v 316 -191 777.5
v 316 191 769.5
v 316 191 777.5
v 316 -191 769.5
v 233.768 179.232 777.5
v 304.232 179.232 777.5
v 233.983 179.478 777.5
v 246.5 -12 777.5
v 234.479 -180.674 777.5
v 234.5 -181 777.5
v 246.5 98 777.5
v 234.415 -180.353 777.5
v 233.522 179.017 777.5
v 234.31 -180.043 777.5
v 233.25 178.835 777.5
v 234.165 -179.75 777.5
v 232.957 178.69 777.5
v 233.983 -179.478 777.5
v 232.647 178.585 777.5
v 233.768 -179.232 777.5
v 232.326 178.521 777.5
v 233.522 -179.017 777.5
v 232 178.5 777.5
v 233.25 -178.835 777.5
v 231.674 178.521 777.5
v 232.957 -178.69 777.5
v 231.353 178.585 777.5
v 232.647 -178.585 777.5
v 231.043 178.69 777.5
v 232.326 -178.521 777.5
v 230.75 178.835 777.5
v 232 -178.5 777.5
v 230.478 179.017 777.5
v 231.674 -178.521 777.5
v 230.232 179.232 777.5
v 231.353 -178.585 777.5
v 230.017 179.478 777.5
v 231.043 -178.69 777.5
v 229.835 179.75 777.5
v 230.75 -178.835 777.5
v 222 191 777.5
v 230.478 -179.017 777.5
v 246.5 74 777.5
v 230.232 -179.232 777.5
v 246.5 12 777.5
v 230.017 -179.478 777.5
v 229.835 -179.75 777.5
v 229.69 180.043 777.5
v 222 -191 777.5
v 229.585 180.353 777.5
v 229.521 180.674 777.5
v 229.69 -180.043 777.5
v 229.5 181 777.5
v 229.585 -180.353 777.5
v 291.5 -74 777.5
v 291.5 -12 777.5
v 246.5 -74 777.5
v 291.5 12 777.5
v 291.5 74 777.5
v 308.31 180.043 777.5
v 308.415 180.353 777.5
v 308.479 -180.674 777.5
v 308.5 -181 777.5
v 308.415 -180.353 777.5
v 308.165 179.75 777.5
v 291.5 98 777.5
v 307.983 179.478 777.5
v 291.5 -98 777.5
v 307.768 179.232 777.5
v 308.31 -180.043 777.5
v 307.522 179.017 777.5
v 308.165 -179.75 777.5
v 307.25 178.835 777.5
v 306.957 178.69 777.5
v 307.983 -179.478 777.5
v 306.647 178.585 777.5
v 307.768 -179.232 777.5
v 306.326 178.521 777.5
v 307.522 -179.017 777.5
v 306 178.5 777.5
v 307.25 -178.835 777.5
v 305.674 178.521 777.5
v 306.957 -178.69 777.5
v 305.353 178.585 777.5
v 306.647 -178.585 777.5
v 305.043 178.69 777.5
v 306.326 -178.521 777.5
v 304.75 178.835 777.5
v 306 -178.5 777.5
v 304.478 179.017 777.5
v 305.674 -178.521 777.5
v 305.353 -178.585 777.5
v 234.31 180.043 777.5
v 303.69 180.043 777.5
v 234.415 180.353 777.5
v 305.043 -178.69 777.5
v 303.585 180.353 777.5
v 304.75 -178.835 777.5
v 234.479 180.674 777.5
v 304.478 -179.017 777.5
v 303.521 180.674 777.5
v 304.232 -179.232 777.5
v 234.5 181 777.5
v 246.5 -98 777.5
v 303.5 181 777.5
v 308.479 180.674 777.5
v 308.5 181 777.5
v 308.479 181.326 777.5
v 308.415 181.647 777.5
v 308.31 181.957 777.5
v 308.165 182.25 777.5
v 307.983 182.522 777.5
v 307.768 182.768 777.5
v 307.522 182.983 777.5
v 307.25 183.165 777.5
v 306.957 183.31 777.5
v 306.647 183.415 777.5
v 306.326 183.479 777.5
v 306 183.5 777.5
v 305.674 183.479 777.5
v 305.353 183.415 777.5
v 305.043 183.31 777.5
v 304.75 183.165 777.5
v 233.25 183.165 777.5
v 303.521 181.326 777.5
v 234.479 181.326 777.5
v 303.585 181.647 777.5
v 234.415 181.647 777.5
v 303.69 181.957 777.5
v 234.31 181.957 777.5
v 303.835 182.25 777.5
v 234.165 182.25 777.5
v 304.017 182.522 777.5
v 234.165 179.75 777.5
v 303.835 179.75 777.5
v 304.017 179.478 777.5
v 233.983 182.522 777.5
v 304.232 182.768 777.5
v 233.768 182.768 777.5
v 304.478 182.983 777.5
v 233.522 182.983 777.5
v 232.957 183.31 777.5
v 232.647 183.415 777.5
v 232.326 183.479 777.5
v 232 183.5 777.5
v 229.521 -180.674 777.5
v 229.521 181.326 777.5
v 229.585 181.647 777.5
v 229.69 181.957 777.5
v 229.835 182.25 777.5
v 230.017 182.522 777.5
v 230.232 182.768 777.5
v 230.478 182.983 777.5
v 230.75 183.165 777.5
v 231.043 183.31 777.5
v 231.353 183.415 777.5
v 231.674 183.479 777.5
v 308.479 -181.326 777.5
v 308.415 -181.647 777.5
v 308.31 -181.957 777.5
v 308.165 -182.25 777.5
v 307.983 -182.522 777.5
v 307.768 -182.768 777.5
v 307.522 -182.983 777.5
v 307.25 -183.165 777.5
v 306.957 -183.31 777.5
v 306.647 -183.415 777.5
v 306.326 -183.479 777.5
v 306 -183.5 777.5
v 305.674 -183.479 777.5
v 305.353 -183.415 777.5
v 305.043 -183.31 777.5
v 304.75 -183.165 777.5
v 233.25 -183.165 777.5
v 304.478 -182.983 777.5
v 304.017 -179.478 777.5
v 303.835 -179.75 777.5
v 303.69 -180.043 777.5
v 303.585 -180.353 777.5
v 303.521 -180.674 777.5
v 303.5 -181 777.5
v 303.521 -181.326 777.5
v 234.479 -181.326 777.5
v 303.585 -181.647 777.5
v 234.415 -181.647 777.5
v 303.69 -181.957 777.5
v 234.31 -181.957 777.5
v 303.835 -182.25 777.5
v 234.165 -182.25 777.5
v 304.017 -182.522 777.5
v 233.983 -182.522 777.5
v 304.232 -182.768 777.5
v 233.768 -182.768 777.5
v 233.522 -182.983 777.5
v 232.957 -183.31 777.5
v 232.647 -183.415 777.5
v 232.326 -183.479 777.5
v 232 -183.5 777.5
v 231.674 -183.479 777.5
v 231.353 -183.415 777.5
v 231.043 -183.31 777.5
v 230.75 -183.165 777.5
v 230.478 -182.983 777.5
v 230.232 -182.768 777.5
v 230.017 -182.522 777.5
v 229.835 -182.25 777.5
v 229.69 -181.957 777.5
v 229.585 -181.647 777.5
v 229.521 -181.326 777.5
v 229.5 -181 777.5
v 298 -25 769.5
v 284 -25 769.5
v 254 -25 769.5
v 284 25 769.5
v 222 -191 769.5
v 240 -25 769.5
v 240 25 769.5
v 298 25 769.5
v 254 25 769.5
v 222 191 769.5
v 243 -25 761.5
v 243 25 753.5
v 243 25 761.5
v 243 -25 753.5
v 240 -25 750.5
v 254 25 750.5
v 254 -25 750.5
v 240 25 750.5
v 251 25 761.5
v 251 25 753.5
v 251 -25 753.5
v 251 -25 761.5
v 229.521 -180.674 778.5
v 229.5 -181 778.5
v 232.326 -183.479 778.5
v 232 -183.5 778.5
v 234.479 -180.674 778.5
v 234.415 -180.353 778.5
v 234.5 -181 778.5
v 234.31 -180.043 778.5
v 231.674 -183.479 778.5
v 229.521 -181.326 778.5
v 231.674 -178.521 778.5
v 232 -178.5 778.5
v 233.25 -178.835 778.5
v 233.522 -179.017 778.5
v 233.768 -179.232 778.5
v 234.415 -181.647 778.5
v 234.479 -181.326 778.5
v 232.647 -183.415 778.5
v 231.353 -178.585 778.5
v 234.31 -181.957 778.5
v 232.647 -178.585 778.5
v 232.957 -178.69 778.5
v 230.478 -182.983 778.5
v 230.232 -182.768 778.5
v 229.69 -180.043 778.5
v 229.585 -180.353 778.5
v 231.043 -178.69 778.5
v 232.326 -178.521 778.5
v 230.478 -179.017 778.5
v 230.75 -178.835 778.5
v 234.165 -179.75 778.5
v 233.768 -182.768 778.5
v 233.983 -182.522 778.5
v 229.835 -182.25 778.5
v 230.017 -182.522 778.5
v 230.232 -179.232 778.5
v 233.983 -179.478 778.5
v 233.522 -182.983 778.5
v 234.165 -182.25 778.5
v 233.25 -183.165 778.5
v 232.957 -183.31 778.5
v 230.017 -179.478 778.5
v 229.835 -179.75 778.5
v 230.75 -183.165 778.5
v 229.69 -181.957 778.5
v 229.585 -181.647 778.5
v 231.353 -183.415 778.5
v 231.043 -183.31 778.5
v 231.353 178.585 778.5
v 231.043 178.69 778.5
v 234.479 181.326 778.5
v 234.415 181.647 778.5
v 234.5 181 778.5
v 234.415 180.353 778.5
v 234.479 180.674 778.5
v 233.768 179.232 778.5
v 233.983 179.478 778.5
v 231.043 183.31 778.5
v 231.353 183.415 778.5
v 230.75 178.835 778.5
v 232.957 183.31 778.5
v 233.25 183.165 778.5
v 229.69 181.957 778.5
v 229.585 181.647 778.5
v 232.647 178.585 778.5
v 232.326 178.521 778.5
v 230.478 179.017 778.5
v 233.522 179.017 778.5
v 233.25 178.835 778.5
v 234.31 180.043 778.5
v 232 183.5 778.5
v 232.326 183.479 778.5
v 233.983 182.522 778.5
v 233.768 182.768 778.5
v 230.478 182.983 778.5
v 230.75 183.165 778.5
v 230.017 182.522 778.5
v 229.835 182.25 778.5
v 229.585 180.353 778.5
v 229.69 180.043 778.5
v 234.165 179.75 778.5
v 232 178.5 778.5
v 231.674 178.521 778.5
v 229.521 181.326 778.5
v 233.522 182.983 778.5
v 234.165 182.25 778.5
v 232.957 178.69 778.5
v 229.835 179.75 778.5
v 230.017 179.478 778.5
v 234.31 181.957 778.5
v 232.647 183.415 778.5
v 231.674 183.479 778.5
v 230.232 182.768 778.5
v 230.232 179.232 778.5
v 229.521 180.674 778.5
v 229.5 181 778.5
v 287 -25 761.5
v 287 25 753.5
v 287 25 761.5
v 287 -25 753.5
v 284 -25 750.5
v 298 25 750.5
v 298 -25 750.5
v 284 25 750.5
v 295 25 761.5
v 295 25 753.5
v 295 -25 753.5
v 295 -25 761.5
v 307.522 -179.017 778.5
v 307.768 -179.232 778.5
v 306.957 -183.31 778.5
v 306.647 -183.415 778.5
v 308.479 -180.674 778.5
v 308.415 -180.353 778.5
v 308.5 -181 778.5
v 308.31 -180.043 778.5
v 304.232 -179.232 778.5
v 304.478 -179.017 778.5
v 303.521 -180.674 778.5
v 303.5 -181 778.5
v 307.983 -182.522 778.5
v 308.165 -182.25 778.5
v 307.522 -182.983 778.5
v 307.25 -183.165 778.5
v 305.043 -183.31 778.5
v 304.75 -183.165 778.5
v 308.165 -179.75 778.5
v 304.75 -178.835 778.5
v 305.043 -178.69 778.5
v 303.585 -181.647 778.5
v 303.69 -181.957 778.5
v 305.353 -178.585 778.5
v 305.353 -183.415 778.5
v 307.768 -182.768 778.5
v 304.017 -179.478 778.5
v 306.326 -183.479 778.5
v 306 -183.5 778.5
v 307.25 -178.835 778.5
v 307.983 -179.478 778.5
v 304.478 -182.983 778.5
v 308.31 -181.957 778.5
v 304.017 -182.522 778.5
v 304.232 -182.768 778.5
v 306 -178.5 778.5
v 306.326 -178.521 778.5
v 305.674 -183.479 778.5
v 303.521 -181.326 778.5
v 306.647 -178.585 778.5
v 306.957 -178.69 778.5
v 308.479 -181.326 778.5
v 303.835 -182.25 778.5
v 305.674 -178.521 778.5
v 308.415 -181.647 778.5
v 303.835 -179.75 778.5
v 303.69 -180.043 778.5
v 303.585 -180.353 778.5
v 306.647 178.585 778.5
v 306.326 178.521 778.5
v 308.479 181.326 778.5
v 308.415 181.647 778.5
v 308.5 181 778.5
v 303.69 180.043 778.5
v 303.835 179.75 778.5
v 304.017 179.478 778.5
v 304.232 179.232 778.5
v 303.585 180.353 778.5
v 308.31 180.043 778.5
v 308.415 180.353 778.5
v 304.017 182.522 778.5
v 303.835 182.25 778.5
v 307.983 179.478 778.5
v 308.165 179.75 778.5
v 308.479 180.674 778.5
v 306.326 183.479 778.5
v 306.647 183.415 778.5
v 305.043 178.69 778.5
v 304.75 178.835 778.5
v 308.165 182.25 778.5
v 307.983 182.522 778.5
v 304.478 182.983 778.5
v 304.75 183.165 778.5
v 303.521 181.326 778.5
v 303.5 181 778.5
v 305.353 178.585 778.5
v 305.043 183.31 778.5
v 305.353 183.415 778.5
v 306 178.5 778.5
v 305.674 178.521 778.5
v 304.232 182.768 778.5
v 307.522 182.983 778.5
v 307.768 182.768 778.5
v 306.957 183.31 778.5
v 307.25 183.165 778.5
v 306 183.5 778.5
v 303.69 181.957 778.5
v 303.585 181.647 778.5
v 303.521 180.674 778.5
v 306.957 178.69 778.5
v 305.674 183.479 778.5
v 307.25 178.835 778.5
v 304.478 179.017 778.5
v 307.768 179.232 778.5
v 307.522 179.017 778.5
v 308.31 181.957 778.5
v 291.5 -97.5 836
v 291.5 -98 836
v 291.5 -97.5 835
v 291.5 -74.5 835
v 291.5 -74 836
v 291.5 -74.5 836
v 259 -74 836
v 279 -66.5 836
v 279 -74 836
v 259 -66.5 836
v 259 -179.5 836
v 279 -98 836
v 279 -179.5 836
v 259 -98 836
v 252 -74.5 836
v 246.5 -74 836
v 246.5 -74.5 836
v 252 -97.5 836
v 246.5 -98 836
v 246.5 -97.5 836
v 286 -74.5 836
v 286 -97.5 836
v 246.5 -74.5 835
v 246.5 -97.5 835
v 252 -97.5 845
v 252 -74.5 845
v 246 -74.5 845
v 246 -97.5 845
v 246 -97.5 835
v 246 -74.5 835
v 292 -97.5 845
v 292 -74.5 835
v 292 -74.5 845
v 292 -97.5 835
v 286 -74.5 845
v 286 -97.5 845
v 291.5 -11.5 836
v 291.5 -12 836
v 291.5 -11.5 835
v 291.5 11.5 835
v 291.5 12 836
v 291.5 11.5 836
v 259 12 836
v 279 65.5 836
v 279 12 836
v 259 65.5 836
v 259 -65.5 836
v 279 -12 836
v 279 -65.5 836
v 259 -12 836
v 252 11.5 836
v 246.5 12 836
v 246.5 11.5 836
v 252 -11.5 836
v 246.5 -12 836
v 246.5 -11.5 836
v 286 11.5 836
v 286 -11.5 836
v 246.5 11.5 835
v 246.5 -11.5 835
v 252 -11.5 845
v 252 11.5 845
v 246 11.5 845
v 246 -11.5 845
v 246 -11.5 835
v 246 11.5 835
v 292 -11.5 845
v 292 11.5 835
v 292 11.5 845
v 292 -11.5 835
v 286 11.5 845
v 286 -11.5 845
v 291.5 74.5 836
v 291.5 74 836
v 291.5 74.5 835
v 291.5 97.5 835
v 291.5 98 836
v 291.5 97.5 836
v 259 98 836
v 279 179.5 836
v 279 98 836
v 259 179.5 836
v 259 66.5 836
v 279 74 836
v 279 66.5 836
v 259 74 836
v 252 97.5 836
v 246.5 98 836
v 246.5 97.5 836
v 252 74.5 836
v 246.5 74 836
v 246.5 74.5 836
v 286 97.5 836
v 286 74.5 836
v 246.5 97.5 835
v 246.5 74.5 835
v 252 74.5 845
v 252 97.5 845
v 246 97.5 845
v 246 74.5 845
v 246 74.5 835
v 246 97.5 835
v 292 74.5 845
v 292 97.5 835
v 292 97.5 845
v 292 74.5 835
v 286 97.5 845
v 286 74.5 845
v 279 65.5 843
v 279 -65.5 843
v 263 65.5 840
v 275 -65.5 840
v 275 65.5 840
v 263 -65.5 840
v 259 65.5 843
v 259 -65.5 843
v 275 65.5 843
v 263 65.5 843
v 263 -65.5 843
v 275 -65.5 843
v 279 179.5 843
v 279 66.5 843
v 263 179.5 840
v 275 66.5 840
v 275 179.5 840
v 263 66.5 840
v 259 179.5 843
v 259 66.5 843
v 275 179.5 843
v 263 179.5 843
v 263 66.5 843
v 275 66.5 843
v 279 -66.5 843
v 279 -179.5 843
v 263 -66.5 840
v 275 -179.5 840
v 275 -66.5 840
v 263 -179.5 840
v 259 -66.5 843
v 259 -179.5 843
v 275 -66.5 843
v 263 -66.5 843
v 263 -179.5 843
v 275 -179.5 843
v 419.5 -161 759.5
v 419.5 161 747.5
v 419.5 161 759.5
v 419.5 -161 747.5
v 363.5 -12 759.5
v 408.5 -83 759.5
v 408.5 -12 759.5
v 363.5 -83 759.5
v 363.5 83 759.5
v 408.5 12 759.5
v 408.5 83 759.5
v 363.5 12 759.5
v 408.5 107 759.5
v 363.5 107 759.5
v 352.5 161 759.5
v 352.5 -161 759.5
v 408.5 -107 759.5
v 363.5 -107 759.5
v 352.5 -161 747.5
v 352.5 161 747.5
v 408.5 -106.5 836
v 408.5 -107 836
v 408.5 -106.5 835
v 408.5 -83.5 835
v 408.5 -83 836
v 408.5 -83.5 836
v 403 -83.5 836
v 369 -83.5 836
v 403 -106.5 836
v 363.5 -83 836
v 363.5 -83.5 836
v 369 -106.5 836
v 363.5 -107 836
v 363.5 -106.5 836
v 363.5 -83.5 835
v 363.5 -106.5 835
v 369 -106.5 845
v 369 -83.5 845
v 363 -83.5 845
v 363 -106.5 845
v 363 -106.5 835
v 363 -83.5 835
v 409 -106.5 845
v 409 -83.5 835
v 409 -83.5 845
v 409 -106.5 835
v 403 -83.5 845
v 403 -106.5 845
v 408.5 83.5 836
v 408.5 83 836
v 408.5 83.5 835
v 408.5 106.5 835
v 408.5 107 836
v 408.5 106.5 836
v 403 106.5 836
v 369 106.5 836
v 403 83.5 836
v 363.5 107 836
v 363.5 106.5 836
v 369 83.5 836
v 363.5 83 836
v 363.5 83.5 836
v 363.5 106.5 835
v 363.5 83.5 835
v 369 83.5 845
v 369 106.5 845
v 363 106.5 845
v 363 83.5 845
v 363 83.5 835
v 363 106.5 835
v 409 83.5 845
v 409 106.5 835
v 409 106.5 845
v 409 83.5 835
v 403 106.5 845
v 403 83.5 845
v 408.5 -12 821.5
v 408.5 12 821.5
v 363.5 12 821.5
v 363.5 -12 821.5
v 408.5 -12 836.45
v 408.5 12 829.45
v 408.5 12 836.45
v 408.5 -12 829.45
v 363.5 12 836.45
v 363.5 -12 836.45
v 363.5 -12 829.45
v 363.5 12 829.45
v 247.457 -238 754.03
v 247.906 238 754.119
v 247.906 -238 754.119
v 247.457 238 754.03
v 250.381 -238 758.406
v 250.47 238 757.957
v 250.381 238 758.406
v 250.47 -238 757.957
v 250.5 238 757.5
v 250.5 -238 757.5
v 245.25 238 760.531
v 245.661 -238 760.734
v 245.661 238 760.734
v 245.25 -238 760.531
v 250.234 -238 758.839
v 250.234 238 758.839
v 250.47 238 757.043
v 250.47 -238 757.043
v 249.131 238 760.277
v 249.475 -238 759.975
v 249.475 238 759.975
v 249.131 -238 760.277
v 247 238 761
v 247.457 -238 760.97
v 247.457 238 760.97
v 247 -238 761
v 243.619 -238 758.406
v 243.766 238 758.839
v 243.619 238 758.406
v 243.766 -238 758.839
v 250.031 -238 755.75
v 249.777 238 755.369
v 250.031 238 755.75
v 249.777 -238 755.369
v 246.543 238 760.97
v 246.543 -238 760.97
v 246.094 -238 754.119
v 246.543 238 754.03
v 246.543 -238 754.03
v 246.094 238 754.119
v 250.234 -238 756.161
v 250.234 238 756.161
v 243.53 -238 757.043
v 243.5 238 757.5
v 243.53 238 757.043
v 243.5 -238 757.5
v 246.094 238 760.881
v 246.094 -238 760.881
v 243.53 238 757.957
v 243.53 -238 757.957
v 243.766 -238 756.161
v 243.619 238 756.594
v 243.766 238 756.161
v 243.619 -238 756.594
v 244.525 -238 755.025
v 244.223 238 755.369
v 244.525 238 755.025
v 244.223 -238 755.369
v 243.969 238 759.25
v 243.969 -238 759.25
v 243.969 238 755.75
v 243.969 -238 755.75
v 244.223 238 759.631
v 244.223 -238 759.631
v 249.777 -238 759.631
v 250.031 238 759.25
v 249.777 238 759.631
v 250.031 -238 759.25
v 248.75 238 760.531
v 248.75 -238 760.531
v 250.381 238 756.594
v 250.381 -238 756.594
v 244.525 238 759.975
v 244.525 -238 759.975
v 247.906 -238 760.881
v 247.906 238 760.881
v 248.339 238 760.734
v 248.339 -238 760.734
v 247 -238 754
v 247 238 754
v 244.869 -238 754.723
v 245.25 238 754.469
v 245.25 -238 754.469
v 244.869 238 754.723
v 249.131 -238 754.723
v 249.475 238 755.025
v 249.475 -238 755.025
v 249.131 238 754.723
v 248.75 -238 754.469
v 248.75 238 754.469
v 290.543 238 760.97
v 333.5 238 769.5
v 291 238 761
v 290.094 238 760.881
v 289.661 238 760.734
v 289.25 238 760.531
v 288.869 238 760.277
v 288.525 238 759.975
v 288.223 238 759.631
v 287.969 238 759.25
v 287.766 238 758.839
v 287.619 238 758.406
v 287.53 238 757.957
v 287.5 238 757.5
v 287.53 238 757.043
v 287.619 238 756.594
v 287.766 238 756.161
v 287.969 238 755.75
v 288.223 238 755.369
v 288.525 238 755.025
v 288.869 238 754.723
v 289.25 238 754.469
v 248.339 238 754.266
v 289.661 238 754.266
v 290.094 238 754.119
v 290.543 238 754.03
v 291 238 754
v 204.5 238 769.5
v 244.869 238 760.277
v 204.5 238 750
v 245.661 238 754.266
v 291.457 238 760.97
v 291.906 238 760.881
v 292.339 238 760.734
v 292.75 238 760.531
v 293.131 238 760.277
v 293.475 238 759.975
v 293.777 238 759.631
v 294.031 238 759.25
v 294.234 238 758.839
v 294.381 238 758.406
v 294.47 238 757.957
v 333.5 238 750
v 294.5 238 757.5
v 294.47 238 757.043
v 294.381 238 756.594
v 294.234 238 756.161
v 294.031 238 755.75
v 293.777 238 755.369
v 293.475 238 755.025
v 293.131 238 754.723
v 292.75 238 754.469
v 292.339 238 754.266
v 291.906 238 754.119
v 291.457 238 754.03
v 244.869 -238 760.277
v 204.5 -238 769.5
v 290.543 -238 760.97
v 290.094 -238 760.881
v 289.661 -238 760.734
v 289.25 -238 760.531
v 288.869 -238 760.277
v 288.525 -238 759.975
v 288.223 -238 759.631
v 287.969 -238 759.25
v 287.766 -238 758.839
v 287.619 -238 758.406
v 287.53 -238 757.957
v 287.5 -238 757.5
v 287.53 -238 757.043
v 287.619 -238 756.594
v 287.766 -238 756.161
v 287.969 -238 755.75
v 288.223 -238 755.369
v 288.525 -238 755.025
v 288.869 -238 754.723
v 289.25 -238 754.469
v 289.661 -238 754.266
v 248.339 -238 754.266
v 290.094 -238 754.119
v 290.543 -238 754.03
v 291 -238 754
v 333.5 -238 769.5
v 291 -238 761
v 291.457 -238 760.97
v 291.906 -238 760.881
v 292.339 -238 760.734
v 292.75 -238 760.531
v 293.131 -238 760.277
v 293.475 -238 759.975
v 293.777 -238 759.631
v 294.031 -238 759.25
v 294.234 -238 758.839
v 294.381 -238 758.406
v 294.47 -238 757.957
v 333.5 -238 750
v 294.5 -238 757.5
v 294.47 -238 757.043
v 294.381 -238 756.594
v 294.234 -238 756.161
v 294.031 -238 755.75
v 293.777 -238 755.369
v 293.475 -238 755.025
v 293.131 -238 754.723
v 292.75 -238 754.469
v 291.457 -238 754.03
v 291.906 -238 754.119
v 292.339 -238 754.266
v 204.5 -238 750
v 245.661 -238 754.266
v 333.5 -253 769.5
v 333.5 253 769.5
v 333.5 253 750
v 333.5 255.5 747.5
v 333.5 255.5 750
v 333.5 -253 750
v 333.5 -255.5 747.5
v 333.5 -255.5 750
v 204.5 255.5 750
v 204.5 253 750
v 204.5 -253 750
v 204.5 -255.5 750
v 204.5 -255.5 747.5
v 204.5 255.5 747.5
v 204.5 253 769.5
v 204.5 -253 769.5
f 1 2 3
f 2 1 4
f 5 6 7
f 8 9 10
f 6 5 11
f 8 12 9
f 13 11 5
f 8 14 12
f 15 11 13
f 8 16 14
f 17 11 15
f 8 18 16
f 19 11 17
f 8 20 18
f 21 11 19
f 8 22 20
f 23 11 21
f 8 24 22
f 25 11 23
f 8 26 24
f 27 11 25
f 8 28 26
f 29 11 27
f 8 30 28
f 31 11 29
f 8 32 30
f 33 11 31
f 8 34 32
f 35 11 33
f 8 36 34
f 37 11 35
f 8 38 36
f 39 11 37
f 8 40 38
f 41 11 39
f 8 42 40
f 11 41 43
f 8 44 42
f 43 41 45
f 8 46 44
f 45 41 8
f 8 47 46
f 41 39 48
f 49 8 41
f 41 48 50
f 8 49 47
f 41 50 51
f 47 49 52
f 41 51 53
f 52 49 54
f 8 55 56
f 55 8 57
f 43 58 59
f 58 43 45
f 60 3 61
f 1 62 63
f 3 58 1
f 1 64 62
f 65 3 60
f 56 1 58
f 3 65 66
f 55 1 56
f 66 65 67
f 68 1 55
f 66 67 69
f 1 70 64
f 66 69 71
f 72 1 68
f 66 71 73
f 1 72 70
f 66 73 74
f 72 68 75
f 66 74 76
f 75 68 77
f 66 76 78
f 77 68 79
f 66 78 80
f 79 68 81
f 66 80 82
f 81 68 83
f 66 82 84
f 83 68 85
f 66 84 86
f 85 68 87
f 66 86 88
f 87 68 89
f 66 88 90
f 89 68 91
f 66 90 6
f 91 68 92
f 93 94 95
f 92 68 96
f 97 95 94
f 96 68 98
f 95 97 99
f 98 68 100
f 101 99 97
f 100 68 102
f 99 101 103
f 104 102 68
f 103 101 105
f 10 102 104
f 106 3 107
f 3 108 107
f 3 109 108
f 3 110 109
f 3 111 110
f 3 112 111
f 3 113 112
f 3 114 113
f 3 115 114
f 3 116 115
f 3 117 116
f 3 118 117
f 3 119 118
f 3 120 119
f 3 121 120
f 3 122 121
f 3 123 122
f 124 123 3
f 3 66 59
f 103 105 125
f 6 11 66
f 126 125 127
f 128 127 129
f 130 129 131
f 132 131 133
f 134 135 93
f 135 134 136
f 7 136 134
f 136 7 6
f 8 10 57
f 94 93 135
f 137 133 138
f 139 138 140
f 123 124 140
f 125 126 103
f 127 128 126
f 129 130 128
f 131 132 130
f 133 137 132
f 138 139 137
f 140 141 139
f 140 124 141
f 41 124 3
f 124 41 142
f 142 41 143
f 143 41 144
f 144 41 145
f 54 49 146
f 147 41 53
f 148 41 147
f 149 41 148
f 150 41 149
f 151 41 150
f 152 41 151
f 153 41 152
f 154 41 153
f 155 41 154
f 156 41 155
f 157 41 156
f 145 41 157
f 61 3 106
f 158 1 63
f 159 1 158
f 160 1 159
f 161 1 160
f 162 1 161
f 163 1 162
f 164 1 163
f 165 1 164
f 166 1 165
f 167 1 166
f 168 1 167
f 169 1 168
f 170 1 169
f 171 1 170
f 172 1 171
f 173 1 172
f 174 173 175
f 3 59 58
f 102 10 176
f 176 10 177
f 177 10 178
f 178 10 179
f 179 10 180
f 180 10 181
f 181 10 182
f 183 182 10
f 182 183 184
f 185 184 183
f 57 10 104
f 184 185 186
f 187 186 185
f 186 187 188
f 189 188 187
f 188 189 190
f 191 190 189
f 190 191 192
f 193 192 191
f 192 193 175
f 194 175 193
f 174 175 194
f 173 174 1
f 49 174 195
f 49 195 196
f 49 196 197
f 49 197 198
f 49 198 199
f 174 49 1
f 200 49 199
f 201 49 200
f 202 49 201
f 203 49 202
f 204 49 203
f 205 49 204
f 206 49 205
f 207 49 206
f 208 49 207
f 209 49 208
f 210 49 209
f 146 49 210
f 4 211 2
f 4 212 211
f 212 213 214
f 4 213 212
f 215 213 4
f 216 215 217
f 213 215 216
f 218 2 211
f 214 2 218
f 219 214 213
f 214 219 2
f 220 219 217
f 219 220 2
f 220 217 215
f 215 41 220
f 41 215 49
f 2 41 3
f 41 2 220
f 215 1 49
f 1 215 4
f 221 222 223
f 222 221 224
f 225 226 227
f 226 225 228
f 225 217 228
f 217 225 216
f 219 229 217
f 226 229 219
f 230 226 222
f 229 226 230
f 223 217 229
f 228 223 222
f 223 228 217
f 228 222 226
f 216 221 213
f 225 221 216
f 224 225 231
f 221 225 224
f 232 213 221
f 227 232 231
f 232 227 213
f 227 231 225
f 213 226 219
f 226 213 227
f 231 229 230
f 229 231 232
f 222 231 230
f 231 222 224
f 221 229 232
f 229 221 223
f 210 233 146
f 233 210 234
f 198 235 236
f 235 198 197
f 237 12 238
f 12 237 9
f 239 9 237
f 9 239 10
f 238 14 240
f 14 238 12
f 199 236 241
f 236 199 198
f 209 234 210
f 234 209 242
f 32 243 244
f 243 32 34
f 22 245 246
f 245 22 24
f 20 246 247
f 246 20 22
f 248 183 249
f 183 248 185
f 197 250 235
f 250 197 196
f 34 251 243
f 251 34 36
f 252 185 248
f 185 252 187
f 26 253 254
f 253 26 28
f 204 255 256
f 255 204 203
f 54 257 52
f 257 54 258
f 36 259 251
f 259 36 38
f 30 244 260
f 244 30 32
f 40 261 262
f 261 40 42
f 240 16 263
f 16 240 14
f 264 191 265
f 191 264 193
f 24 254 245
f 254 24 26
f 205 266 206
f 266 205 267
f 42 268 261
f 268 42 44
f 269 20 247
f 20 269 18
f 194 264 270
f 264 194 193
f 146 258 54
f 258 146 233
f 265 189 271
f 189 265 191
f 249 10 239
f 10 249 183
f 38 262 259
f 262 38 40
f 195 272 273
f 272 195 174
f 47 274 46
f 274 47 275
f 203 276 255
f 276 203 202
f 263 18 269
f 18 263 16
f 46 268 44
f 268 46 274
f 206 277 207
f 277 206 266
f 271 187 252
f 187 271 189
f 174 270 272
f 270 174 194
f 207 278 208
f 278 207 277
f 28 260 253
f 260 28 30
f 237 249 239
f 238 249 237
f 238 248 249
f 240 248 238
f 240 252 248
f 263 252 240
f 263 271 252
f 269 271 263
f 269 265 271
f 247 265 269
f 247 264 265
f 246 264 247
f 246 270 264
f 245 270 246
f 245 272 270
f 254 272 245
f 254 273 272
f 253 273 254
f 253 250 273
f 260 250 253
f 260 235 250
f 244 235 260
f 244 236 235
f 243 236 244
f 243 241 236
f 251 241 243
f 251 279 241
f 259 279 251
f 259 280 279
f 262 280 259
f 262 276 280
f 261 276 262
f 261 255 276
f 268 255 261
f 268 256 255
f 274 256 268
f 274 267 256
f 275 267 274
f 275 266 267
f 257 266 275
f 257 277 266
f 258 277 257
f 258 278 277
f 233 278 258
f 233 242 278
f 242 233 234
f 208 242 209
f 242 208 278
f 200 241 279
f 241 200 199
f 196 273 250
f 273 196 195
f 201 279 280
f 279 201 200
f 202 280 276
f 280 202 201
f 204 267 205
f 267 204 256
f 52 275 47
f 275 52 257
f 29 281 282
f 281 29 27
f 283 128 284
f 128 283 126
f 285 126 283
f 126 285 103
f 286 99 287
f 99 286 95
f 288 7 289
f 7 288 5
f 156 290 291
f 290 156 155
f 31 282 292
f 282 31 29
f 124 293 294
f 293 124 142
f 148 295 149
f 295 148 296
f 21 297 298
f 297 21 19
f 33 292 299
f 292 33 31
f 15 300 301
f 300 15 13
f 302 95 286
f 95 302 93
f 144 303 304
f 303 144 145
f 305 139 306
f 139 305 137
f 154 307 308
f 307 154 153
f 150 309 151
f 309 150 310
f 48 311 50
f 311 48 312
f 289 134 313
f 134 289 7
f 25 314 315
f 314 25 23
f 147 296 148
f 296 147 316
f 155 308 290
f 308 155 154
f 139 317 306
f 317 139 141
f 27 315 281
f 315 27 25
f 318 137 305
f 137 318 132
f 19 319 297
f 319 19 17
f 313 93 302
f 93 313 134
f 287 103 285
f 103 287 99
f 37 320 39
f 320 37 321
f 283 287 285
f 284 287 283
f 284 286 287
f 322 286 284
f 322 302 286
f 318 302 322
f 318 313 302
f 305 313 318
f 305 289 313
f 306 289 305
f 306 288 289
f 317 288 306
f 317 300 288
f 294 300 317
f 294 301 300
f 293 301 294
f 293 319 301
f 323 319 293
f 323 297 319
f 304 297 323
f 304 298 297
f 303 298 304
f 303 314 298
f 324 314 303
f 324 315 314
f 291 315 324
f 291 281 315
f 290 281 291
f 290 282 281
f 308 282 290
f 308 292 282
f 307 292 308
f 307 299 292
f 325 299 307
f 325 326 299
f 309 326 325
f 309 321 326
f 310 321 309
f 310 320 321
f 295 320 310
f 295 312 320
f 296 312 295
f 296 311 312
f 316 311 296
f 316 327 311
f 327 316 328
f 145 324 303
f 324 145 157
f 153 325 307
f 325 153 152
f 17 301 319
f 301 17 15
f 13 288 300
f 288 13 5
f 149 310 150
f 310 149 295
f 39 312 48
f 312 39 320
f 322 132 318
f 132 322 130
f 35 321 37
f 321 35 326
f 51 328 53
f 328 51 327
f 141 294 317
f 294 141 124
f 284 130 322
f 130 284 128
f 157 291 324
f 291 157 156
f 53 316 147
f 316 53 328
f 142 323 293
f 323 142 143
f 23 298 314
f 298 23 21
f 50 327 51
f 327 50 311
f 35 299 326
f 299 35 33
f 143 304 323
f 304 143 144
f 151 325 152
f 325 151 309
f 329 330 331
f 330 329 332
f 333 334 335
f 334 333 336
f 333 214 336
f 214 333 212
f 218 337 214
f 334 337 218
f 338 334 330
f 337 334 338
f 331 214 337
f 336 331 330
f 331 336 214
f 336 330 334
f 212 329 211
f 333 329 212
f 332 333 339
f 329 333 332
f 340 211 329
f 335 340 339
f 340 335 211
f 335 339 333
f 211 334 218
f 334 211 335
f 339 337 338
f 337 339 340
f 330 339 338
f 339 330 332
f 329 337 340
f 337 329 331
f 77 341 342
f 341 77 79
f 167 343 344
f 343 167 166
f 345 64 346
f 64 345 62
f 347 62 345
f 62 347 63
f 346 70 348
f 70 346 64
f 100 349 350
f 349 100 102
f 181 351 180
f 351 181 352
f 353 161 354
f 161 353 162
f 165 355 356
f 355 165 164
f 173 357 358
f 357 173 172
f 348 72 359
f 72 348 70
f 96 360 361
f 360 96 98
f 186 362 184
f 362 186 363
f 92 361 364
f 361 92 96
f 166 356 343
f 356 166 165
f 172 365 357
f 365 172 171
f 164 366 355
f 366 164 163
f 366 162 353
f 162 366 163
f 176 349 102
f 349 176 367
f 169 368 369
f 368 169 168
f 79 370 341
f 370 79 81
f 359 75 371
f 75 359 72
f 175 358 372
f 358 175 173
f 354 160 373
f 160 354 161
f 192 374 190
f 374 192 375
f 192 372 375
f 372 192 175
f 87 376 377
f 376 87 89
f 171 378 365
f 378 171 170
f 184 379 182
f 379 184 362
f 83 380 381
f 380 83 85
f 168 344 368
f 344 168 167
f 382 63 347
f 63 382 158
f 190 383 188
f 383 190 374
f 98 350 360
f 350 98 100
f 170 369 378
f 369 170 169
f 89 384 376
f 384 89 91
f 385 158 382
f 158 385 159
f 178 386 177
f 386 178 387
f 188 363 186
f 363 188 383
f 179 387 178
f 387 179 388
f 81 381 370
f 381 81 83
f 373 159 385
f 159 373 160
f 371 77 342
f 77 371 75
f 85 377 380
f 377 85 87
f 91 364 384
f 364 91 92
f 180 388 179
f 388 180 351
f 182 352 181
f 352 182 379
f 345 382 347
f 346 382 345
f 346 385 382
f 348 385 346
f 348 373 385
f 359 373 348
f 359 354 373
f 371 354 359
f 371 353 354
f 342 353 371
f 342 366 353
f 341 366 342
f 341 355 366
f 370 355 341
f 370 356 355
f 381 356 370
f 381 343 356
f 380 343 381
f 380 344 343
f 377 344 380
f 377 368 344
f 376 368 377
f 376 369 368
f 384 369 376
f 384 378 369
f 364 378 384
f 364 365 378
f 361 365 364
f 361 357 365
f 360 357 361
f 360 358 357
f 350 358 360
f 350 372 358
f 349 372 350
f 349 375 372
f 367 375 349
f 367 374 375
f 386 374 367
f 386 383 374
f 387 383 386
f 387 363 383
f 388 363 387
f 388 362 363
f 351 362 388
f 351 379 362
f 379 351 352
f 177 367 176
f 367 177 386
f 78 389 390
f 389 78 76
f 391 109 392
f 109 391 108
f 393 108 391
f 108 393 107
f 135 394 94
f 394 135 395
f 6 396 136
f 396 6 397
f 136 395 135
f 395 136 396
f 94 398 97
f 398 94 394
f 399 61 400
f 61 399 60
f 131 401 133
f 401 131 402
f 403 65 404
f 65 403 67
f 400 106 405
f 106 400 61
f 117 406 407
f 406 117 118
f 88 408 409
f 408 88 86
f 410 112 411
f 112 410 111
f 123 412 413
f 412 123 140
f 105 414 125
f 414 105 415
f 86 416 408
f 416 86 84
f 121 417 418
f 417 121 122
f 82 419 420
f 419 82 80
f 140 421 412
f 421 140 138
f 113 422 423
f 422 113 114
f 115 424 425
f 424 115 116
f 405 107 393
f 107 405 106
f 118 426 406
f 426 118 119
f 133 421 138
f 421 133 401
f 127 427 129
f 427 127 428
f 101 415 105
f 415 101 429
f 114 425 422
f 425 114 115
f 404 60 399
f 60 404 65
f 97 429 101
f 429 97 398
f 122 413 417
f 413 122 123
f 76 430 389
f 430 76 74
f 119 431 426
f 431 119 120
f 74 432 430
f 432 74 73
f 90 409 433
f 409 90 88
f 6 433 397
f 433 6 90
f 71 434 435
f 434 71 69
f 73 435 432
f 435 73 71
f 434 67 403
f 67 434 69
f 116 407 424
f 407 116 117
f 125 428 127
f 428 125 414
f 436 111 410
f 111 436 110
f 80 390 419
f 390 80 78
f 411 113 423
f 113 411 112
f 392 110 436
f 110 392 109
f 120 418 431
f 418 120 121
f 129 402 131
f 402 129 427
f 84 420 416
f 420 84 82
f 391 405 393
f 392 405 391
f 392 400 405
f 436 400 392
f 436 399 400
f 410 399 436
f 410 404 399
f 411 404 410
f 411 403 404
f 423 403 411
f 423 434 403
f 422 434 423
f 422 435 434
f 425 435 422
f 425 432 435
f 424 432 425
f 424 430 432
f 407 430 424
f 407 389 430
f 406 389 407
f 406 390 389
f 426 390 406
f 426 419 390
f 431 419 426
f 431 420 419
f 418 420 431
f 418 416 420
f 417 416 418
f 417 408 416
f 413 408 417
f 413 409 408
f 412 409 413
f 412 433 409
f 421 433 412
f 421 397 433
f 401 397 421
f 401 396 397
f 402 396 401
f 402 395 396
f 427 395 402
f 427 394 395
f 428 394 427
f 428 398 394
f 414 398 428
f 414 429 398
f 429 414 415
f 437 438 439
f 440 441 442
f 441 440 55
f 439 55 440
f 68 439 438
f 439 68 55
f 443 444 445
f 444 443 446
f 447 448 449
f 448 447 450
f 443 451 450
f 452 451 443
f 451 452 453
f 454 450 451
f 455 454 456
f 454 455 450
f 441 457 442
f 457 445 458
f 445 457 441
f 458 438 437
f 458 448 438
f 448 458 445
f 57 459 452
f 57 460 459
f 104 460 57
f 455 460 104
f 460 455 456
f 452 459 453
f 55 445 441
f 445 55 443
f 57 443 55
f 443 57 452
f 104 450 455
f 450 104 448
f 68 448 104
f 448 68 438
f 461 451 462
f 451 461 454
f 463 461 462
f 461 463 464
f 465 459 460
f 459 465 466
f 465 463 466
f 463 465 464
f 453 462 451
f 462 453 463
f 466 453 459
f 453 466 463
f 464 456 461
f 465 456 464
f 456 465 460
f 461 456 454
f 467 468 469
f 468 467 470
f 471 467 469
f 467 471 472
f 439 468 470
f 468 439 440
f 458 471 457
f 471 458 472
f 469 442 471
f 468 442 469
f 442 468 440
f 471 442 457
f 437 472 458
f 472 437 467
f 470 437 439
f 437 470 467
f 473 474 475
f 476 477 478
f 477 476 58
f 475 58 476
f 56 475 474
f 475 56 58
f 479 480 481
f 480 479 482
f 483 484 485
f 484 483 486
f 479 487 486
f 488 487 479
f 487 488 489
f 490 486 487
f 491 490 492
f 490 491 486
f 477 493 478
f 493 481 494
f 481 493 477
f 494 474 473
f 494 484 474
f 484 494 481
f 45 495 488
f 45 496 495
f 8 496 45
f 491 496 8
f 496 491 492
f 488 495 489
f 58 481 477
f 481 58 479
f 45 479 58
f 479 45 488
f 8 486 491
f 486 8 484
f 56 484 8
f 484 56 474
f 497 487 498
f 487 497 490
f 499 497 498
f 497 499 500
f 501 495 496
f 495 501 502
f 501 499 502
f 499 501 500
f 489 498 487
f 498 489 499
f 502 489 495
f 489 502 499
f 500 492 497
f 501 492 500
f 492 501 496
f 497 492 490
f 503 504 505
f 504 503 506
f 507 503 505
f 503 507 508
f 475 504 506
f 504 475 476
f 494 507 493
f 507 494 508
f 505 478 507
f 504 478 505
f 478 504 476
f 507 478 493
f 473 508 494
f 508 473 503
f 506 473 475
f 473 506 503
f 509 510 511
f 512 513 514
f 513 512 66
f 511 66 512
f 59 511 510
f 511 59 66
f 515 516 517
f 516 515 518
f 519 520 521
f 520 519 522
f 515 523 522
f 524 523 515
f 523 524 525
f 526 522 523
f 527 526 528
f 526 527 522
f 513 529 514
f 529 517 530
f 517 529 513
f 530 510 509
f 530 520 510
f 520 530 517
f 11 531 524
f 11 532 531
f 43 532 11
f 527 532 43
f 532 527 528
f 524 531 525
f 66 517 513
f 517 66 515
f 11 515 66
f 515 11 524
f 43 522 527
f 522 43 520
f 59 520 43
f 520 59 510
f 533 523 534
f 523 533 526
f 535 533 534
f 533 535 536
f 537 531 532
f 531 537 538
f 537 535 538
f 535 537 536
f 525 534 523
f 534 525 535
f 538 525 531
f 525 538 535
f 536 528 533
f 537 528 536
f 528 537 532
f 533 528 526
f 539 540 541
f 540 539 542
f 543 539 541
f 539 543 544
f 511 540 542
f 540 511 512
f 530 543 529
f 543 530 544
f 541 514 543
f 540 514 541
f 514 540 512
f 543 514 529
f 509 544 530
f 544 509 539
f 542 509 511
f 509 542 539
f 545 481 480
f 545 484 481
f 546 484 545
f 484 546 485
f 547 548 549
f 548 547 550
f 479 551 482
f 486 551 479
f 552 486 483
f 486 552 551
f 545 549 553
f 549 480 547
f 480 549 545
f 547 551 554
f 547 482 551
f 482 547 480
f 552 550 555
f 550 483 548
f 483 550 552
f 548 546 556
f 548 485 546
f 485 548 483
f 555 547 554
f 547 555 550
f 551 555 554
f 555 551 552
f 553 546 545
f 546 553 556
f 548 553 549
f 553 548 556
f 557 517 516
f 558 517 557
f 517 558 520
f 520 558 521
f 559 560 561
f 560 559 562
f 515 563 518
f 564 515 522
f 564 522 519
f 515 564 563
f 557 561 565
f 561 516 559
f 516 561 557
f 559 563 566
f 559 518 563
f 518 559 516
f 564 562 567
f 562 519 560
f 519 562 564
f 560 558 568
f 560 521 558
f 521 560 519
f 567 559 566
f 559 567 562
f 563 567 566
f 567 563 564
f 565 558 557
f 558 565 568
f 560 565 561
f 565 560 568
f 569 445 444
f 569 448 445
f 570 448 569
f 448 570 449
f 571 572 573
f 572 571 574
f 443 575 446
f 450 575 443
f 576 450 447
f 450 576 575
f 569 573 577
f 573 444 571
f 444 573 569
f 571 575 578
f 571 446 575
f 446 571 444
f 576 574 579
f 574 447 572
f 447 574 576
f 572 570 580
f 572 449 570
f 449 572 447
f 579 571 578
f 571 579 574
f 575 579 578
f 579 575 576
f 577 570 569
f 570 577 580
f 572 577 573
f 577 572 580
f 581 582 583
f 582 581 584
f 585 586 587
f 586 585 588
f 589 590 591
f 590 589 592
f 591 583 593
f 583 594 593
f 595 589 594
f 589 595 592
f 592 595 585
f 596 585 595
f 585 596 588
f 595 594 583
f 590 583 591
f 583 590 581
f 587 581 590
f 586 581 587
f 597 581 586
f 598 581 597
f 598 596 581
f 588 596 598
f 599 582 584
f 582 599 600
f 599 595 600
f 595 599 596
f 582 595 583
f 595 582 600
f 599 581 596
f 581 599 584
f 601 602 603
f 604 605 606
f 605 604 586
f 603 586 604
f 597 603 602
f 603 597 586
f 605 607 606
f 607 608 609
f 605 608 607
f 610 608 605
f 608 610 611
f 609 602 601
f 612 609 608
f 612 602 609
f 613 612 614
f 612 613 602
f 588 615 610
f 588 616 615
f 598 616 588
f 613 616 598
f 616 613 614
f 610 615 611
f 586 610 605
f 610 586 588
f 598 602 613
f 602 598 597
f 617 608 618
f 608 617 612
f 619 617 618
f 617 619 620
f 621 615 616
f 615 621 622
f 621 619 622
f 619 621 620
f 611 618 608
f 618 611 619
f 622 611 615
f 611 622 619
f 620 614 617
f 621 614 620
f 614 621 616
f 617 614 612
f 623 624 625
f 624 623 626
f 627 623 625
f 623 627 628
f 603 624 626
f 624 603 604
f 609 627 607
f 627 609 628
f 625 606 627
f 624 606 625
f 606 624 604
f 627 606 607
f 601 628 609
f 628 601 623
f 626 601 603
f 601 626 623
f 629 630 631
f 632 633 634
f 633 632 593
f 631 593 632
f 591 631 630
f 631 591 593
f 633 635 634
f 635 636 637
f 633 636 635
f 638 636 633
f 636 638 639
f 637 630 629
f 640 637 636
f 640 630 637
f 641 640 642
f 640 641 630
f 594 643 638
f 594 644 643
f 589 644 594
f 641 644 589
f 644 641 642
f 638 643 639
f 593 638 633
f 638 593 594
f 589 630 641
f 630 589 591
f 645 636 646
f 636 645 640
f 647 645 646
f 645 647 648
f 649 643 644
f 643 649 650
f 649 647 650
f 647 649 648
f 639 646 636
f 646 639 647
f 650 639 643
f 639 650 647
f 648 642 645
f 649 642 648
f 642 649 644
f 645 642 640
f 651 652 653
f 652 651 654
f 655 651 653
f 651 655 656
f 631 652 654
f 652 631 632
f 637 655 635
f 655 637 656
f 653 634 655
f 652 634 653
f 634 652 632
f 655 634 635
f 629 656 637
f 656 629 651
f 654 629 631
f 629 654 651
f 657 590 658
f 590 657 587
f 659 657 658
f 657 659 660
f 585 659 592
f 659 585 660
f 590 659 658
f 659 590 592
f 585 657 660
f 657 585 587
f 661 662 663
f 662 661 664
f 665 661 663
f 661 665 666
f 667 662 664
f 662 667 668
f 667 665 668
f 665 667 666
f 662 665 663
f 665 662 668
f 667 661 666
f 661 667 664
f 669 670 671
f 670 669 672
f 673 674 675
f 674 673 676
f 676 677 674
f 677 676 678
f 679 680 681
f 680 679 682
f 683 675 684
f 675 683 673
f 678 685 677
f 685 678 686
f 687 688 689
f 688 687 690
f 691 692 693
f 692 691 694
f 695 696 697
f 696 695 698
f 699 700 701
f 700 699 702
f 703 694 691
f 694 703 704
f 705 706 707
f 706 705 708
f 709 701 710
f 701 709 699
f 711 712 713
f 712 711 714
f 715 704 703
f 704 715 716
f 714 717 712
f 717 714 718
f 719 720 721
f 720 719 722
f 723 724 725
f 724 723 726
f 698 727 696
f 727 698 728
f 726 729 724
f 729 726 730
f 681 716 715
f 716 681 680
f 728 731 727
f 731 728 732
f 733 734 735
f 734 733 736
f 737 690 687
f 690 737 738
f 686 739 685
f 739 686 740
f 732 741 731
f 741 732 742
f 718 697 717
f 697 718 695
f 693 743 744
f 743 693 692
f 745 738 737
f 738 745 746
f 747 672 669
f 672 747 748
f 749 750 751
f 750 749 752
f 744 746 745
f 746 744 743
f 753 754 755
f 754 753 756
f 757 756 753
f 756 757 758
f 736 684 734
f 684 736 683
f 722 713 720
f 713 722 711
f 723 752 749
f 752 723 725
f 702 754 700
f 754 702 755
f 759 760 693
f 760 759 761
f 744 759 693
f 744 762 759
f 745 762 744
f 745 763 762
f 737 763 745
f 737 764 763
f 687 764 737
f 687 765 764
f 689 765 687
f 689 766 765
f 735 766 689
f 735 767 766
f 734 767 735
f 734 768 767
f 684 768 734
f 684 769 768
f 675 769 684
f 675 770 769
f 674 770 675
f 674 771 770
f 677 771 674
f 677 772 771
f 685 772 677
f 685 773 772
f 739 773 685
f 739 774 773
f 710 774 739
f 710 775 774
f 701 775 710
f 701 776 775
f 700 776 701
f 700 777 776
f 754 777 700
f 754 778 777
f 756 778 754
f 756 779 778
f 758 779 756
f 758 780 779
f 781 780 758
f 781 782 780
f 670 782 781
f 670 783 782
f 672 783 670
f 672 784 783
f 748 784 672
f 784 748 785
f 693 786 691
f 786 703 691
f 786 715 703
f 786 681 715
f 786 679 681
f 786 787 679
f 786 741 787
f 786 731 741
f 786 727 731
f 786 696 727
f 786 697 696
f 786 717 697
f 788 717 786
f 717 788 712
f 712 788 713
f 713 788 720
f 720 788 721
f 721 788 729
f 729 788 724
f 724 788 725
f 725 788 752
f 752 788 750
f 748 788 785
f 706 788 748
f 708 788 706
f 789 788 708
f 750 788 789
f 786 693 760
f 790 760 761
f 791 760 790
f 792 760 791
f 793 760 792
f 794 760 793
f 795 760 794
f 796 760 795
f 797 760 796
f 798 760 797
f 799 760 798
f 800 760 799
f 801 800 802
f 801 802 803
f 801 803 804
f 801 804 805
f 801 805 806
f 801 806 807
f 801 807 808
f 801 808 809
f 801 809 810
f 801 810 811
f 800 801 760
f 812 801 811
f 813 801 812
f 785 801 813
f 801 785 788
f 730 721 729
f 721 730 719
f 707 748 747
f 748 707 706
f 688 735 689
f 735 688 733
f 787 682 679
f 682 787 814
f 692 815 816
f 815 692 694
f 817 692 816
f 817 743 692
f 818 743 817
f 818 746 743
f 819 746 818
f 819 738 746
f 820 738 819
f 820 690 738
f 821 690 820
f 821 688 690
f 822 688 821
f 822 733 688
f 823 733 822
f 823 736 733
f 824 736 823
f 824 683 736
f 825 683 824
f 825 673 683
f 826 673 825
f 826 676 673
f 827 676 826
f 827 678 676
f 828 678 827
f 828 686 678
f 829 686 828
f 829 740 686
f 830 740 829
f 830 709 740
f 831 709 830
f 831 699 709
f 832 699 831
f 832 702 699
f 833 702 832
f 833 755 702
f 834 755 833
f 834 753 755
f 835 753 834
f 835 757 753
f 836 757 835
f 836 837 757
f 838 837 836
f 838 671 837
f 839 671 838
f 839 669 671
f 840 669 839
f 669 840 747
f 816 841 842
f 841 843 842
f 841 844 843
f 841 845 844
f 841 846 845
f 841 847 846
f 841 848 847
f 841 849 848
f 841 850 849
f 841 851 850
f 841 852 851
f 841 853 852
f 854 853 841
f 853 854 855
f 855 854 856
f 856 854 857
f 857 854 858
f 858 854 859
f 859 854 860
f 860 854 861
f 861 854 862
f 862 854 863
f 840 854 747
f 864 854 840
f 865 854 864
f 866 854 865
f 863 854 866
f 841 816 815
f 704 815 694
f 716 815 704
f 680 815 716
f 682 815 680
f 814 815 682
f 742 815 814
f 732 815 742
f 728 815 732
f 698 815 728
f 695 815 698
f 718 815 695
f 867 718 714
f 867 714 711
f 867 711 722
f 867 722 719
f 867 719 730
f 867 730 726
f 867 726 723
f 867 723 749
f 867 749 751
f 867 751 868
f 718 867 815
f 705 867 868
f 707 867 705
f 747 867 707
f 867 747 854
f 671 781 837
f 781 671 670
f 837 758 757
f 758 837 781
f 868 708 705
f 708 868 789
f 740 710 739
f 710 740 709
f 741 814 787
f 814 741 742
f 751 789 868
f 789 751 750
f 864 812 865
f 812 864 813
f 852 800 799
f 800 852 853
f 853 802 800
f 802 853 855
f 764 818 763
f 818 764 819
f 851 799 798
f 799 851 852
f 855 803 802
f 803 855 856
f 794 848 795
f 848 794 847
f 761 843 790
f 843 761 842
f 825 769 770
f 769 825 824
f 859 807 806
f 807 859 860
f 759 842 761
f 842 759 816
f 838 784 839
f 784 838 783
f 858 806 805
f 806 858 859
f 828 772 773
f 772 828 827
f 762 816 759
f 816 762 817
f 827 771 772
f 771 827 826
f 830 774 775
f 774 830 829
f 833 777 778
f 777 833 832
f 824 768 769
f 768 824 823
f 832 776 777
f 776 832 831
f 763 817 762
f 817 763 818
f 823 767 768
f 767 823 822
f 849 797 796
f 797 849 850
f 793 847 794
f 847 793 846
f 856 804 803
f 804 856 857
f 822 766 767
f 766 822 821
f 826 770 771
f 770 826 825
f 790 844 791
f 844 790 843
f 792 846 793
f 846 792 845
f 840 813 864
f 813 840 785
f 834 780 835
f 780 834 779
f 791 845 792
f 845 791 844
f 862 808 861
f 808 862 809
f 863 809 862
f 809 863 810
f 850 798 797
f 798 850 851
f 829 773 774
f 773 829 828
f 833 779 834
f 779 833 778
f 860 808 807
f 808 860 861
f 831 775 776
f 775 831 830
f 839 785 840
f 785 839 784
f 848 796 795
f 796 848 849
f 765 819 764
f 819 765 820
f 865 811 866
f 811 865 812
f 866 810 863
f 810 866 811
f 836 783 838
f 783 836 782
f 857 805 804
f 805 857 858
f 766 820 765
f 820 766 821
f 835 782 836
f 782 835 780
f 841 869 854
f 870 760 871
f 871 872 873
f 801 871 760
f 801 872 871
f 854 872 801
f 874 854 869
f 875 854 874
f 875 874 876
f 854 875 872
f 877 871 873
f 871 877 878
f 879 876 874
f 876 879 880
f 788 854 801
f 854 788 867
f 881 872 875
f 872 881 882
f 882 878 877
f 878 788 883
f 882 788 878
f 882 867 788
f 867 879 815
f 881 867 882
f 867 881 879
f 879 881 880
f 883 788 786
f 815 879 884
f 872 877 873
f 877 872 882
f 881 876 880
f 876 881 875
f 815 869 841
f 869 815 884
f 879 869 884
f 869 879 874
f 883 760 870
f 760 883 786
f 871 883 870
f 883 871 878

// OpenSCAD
// Millimetre geometric reference; use real functional tools, not printed heated or cutting equipment.
// Source SHA-256: 94f34a7056a9d24379da1dac9f9b9d27ac03e0cb14ce7981b4b7693647e8a8c4
$fn=48;
module profile_carriage(){
translate([0, 0, 11]) rotate([0, 0, 0]) cube([94, 382, 8],center=true);
translate([-27.5, 0, -5]) rotate([0, 0, 0]) cube([3, 50, 14],center=true);
translate([-16.5, 0, -5]) rotate([0, 0, 0]) cube([3, 50, 14],center=true);
translate([-22, 0, -10.5]) rotate([0, 0, 0]) cube([8, 50, 3],center=true);
translate([-22, 0, 0.5]) rotate([0, 0, 0]) cube([8, 50, 3],center=true);
translate([-22, 0, 4.5]) rotate([0, 0, 0]) cube([14, 50, 6],center=true);
translate([-37, -181, 15.5]) rotate([0, 0, 0]) cylinder(r=2.5,h=1,center=true);
translate([-37, 181, 15.5]) rotate([0, 0, 0]) cylinder(r=2.5,h=1,center=true);
translate([16.5, 0, -5]) rotate([0, 0, 0]) cube([3, 50, 14],center=true);
translate([27.5, 0, -5]) rotate([0, 0, 0]) cube([3, 50, 14],center=true);
translate([22, 0, -10.5]) rotate([0, 0, 0]) cube([8, 50, 3],center=true);
translate([22, 0, 0.5]) rotate([0, 0, 0]) cube([8, 50, 3],center=true);
translate([22, 0, 4.5]) rotate([0, 0, 0]) cube([14, 50, 6],center=true);
translate([37, -181, 15.5]) rotate([0, 0, 0]) cylinder(r=2.5,h=1,center=true);
translate([37, 181, 15.5]) rotate([0, 0, 0]) cylinder(r=2.5,h=1,center=true);
translate([0, -86, 44.25]) rotate([0, 0, 0]) cube([45, 24, 58.5],center=true);
translate([-20, -86, 77.5]) rotate([0, 0, 0]) cube([6, 23, 10],center=true);
translate([20, -86, 77.5]) rotate([0, 0, 0]) cube([6, 23, 10],center=true);
translate([0, 0, 44.25]) rotate([0, 0, 0]) cube([45, 24, 58.5],center=true);
translate([-20, 0, 77.5]) rotate([0, 0, 0]) cube([6, 23, 10],center=true);
translate([20, 0, 77.5]) rotate([0, 0, 0]) cube([6, 23, 10],center=true);
translate([0, 86, 44.25]) rotate([0, 0, 0]) cube([45, 24, 58.5],center=true);
translate([-20, 86, 77.5]) rotate([0, 0, 0]) cube([6, 23, 10],center=true);
translate([20, 86, 77.5]) rotate([0, 0, 0]) cube([6, 23, 10],center=true);
}
module profile_center(){
translate([0, 0, -1.5]) rotate([0, 0, 0]) cube([20, 131, 4],center=true);
translate([-8, 0, 2]) rotate([0, 0, 0]) cube([4, 131, 3],center=true);
translate([8, 0, 2]) rotate([0, 0, 0]) cube([4, 131, 3],center=true);
}
module profile_positive_end(){
translate([0, 0, -1.5]) rotate([0, 0, 0]) cube([20, 113, 4],center=true);
translate([-8, 0, 2]) rotate([0, 0, 0]) cube([4, 113, 3],center=true);
translate([8, 0, 2]) rotate([0, 0, 0]) cube([4, 113, 3],center=true);
}
module profile_negative_end(){
translate([0, 0, -1.5]) rotate([0, 0, 0]) cube([20, 113, 4],center=true);
translate([-8, 0, 2]) rotate([0, 0, 0]) cube([4, 113, 3],center=true);
translate([8, 0, 2]) rotate([0, 0, 0]) cube([4, 113, 3],center=true);
}
module receiving_saddles(){
translate([0, 0, -28]) rotate([0, 0, 0]) cube([67, 322, 12],center=true);
translate([0, -95, 16.25]) rotate([0, 0, 0]) cube([45, 24, 76.5],center=true);
translate([-20, -95, 58.5]) rotate([0, 0, 0]) cube([6, 23, 10],center=true);
translate([20, -95, 58.5]) rotate([0, 0, 0]) cube([6, 23, 10],center=true);
translate([0, 95, 16.25]) rotate([0, 0, 0]) cube([45, 24, 76.5],center=true);
translate([-20, 95, 58.5]) rotate([0, 0, 0]) cube([6, 23, 10],center=true);
translate([20, 95, 58.5]) rotate([0, 0, 0]) cube([6, 23, 10],center=true);
translate([0, 0, 9]) rotate([0, 0, 0]) cube([45, 24, 62],center=true);
}
module spring_middle_saddle(){
translate([0, 0, 0]) rotate([0, 0, 0]) cube([45, 24, 7],center=true);
}
module profile_carriage_rail_left(){
translate([0, 0, 0]) rotate([0, 0, 0]) rotate([90,0,0]) cylinder(r=3.5,h=476,center=true);
}
module profile_carriage_rail_right(){
translate([0, 0, 0]) rotate([0, 0, 0]) rotate([90,0,0]) cylinder(r=3.5,h=476,center=true);
}
module profile_carriage_base(){
translate([0, 0, 0]) rotate([0, 0, 0]) cube([129, 511, 2.5],center=true);
}
module profile_carriage_end_front(){
translate([0, 0, 0]) rotate([0, 0, 0]) cube([129, 15, 22],center=true);
}
module profile_carriage_end_back(){
translate([0, 0, 0]) rotate([0, 0, 0]) cube([129, 15, 22],center=true);
}
translate([269, 0, 762.5]) rotate([0,0,0]) profile_carriage();
translate([269, 0, 839.5]) rotate([0,0,0]) profile_center();
translate([269, 123, 839.5]) rotate([0,0,0]) profile_positive_end();
translate([269, -123, 839.5]) rotate([0,0,0]) profile_negative_end();
translate([386, 0, 781.5]) rotate([0,0,0]) receiving_saddles();
translate([386, 0, 832.95]) rotate([0,0,0]) spring_middle_saddle();
translate([247, 0, 757.5]) rotate([0,0,0]) profile_carriage_rail_left();
translate([291, 0, 757.5]) rotate([0,0,0]) profile_carriage_rail_right();
translate([269, 0, 748.75]) rotate([0,0,0]) profile_carriage_base();
translate([269, -245.5, 758.5]) rotate([0,0,0]) profile_carriage_end_front();
translate([269, 245.5, 758.5]) rotate([0,0,0]) profile_carriage_end_back();
